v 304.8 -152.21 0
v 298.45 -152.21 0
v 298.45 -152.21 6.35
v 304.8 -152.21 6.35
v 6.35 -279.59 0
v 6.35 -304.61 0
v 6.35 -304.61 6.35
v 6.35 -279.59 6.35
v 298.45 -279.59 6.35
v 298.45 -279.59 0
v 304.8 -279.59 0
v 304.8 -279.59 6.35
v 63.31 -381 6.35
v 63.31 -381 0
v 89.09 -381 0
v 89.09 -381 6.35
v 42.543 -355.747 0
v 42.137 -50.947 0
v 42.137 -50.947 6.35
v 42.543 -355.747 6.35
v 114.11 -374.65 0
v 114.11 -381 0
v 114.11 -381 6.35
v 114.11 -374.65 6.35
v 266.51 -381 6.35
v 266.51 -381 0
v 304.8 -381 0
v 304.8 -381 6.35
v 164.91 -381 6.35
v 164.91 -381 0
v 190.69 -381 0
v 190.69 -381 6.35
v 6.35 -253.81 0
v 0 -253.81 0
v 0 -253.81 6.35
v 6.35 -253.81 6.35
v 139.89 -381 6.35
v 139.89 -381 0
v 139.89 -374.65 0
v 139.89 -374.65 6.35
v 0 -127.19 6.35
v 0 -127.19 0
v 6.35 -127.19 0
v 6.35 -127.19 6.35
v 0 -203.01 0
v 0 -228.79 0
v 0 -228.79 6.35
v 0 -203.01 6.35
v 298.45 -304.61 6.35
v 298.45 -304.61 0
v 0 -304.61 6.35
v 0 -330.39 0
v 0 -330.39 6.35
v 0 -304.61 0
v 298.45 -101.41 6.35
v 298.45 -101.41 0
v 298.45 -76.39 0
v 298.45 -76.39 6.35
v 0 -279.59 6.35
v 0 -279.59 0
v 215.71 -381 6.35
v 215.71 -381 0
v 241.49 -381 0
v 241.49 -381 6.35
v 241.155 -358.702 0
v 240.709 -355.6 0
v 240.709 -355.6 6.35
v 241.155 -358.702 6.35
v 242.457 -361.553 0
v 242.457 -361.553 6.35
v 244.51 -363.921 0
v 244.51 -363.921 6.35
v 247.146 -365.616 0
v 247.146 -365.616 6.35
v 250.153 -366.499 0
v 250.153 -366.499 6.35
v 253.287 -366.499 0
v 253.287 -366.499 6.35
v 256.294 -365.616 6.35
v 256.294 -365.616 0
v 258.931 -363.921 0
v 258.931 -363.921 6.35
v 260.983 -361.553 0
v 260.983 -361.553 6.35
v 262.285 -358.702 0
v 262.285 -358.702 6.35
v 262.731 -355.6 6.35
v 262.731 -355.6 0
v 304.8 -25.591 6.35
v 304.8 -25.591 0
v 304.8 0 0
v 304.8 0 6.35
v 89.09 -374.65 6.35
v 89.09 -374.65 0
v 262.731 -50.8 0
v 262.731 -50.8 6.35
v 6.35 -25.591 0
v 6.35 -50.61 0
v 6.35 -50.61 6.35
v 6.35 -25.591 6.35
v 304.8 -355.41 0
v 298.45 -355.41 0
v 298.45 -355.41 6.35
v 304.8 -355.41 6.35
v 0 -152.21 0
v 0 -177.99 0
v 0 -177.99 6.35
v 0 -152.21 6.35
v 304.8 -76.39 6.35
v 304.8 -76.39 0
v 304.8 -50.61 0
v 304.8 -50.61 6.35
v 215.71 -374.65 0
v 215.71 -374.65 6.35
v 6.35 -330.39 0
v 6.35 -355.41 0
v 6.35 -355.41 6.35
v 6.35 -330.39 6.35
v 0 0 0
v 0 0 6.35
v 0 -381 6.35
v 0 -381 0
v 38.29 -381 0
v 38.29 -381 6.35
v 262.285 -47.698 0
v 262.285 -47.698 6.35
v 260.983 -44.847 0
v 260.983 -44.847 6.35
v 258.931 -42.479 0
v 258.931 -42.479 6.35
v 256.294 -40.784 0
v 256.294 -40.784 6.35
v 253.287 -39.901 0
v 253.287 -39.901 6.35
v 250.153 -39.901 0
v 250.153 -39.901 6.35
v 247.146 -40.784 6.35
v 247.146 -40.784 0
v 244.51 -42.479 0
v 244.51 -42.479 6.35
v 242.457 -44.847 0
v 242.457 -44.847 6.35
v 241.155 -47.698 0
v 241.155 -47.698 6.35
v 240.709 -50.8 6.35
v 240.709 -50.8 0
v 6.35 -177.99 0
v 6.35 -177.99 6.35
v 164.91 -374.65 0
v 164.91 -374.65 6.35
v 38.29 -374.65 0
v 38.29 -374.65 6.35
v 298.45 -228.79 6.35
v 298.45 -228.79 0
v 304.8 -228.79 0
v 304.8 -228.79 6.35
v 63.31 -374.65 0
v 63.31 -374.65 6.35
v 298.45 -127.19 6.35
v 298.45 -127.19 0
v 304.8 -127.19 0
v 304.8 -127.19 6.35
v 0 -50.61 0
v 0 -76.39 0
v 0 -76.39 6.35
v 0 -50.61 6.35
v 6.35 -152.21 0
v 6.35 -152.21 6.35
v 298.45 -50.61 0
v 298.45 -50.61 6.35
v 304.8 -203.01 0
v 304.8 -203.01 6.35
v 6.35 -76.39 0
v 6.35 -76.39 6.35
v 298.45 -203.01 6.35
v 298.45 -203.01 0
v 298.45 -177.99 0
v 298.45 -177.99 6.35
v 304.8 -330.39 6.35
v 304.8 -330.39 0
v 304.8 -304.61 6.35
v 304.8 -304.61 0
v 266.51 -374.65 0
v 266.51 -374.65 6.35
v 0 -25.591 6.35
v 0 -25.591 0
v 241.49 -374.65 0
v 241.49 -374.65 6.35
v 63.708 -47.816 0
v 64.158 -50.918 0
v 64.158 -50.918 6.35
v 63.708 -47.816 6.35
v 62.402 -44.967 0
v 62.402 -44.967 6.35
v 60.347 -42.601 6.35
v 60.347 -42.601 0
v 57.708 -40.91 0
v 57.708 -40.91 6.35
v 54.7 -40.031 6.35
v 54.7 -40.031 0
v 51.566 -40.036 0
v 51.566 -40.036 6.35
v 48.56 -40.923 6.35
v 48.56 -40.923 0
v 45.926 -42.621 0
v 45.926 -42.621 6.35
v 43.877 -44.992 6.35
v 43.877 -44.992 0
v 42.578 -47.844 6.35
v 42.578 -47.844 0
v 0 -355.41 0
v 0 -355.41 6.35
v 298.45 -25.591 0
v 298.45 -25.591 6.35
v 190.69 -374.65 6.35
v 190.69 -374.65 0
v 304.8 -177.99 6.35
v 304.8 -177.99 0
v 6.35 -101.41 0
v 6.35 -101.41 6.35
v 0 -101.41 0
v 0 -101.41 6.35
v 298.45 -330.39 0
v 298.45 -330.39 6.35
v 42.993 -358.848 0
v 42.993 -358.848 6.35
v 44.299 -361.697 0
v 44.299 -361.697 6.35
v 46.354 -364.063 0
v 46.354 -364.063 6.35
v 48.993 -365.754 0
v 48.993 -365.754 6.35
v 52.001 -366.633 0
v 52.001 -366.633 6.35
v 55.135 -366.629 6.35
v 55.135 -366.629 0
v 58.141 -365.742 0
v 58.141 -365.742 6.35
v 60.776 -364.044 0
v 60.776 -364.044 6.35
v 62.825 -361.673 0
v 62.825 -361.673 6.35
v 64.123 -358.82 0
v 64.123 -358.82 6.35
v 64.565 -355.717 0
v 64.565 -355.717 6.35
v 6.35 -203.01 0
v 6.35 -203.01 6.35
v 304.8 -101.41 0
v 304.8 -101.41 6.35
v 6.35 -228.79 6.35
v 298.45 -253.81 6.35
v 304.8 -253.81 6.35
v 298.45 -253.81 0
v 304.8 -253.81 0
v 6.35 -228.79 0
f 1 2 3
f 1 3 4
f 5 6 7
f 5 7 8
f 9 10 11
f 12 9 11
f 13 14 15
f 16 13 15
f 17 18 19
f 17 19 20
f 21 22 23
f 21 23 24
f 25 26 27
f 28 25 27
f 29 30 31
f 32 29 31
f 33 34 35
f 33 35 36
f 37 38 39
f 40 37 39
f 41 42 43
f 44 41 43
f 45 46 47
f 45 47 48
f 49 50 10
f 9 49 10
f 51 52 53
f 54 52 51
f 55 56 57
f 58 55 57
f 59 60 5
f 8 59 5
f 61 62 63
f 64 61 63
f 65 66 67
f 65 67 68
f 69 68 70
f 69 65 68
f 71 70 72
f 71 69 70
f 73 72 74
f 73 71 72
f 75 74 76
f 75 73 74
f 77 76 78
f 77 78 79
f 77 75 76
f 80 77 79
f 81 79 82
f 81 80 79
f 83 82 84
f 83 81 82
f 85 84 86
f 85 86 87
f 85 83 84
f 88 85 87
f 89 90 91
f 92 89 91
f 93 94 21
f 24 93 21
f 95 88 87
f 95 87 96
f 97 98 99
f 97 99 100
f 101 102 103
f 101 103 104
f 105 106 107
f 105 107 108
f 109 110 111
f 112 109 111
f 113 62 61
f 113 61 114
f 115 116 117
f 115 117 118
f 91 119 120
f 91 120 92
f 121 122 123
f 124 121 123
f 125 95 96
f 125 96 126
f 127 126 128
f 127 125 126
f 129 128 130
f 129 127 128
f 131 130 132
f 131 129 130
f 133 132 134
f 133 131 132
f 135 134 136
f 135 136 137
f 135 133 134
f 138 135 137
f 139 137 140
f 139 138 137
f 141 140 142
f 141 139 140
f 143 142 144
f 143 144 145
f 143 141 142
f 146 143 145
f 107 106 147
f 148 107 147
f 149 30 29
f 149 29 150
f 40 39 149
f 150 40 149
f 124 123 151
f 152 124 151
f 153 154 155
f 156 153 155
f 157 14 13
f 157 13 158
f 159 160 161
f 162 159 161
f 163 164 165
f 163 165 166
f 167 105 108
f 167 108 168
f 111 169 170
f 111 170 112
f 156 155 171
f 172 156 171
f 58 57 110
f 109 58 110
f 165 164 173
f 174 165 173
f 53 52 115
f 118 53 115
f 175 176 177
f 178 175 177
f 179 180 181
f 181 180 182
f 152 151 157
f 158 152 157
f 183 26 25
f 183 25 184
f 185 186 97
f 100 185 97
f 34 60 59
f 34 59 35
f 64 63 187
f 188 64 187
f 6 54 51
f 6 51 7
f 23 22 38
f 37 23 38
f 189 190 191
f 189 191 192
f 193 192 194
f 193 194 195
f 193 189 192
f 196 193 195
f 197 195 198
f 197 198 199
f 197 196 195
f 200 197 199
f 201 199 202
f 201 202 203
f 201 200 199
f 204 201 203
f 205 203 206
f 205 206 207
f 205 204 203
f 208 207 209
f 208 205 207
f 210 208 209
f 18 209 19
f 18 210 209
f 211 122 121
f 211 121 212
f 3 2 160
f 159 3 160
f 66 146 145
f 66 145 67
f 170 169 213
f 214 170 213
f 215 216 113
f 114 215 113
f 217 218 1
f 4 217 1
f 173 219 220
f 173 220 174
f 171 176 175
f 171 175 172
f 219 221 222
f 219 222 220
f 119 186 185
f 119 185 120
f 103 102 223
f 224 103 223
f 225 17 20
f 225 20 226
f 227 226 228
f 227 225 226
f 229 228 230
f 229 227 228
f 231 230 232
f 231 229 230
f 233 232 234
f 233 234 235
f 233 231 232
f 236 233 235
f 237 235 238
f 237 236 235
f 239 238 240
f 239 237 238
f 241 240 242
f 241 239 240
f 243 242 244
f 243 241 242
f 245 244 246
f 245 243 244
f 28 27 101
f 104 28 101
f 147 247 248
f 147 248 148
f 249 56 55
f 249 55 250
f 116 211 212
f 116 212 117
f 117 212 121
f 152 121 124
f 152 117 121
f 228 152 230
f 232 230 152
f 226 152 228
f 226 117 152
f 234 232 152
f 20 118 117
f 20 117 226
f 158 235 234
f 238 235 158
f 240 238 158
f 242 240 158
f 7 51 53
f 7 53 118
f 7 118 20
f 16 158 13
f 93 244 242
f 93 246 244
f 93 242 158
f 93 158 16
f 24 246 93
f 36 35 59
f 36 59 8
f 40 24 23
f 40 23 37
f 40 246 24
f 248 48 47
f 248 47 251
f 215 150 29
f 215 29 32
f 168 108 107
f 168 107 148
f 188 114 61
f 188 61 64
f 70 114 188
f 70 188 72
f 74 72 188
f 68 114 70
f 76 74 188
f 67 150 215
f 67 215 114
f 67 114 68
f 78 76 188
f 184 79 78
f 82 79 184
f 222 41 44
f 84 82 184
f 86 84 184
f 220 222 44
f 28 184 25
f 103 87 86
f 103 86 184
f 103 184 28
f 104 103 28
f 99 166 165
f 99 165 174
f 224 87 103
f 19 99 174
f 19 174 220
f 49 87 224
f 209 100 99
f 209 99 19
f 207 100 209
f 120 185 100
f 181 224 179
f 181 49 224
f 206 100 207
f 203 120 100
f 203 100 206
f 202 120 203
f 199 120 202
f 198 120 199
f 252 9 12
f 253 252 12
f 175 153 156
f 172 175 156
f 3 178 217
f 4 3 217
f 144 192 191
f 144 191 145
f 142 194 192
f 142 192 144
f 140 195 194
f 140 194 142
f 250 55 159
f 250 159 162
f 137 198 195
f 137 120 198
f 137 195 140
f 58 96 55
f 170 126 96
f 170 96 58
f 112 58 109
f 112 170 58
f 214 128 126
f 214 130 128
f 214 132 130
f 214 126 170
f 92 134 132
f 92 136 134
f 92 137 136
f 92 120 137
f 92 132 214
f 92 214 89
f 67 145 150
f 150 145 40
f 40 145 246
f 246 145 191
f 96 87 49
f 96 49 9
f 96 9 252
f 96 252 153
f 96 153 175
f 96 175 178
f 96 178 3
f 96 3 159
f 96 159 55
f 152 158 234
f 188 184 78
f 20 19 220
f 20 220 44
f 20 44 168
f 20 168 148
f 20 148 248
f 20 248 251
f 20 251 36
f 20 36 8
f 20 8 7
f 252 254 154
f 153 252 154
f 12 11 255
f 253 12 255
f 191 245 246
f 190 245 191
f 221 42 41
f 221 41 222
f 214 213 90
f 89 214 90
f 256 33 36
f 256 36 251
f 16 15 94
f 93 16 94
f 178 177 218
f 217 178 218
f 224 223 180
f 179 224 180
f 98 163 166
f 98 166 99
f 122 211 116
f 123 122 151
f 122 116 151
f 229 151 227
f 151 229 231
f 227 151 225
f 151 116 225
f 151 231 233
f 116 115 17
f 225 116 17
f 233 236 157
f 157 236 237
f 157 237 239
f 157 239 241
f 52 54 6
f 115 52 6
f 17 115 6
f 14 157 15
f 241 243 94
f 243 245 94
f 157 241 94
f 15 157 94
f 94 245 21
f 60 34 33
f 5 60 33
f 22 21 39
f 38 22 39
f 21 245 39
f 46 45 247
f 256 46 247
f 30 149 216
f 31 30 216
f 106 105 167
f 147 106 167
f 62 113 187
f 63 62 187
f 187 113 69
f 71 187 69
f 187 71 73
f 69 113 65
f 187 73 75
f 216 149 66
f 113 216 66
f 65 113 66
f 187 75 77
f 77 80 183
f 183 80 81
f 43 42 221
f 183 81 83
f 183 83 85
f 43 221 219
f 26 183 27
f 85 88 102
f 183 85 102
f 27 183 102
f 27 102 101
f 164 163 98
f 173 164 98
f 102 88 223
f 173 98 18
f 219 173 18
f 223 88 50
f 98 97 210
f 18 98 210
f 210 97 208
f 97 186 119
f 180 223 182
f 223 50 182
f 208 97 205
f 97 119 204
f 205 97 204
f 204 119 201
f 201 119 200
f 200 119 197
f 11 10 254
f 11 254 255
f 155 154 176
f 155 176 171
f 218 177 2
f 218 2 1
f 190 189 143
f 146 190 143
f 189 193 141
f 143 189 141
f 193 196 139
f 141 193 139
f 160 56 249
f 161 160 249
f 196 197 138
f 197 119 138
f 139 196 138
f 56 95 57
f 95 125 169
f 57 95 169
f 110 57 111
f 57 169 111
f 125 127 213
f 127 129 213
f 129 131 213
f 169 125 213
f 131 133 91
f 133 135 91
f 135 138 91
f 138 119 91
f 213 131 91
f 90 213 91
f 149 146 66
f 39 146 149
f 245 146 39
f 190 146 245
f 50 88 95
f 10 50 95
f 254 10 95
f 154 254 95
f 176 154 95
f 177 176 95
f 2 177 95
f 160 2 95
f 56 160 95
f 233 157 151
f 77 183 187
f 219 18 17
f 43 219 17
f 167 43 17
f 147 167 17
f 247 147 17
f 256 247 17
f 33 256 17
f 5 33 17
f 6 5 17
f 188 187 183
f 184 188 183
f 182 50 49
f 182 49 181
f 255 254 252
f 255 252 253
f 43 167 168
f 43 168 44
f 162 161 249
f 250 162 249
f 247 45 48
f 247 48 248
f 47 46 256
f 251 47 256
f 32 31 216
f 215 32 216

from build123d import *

# Parameters (mm, degrees)
SKETCH1_W           = 304.8
SKETCH1_H           = 381
BOSS_EXTRUDE1_DEPTH = 6.35
SKETCH2_W           = 6.35
SKETCH2_H           = 25.019
SKETCH2_W_2         = 25.019
SKETCH2_H_2         = 6.35
CUT_EXTRUDE3_DEPTH  = 6.35


with BuildPart() as part:
    # Sketch1 → Boss-Extrude1 (new body)
    with BuildSketch(Plane.XY):
        with Locations((152.4, -190.5)):
            Rectangle(SKETCH1_W, SKETCH1_H)
    extrude(amount=BOSS_EXTRUDE1_DEPTH)

    # Sketch2 → Cut-Extrude3 (cut)
    with BuildSketch(Plane.XY):
        with Locations((301.625, -38.1)):
            Rectangle(SKETCH2_W, SKETCH2_H)
        with BuildLine():
            Line((240.70945, -50.8), (240.70945, -355.600000025))
            ThreePointArc((240.70945, -355.600000025), (251.720356878, -366.610893146), (262.73125, -355.599986268))
            Line((262.73125, -355.599986268), (262.73125, -50.8))
            ThreePointArc((262.73125, -50.8), (251.72035, -39.7891), (240.70945, -50.8))
        make_face()
        with Locations((3.175, -38.1)):
            Rectangle(SKETCH2_W, SKETCH2_H)
        with Locations((301.625, -88.9)):
            Rectangle(SKETCH2_W, SKETCH2_H)
        with Locations((301.625, -139.7)):
            Rectangle(SKETCH2_W, SKETCH2_H)
        with Locations((301.625, -190.5)):
            Rectangle(SKETCH2_W, SKETCH2_H)
        with Locations((301.625, -241.3)):
            Rectangle(SKETCH2_W, SKETCH2_H)
        with Locations((301.625, -292.1)):
            Rectangle(SKETCH2_W, SKETCH2_H)
        with Locations((301.625, -342.9)):
            Rectangle(SKETCH2_W, SKETCH2_H)
        with Locations((3.175, -88.9)):
            Rectangle(SKETCH2_W, SKETCH2_H)
        with Locations((3.175, -139.7)):
            Rectangle(SKETCH2_W, SKETCH2_H)
        with Locations((3.175, -190.5)):
            Rectangle(SKETCH2_W, SKETCH2_H)
        with Locations((3.175, -241.3)):
            Rectangle(SKETCH2_W, SKETCH2_H)
        with Locations((3.175, -292.1)):
            Rectangle(SKETCH2_W, SKETCH2_H)
        with Locations((3.175, -342.9)):
            Rectangle(SKETCH2_W, SKETCH2_H)
        with Locations((101.6, -377.825)):
            Rectangle(SKETCH2_W_2, SKETCH2_H_2)
        with Locations((50.8, -377.825)):
            Rectangle(SKETCH2_W_2, SKETCH2_H_2)
        with Locations((152.4, -377.825)):
            Rectangle(SKETCH2_W_2, SKETCH2_H_2)
        with Locations((203.2, -377.825)):
            Rectangle(SKETCH2_W_2, SKETCH2_H_2)
        with Locations((254, -377.825)):
            Rectangle(SKETCH2_W_2, SKETCH2_H_2)
        with BuildLine():
            Line((42.136581375, -50.947063112), (42.542981176, -355.746778447))
            ThreePointArc((42.542981176, -355.746778447), (53.568545713, -366.742994354), (64.56476162, -355.717429817))
            Line((64.56476162, -355.717429817), (64.1583618, -50.917700725))
            ThreePointArc((64.1583618, -50.917700725), (53.132790394, -39.921491706), (42.136581375, -50.947063112))
        make_face()
    extrude(amount=CUT_EXTRUDE3_DEPTH, mode=Mode.SUBTRACT)


solid = part.part
